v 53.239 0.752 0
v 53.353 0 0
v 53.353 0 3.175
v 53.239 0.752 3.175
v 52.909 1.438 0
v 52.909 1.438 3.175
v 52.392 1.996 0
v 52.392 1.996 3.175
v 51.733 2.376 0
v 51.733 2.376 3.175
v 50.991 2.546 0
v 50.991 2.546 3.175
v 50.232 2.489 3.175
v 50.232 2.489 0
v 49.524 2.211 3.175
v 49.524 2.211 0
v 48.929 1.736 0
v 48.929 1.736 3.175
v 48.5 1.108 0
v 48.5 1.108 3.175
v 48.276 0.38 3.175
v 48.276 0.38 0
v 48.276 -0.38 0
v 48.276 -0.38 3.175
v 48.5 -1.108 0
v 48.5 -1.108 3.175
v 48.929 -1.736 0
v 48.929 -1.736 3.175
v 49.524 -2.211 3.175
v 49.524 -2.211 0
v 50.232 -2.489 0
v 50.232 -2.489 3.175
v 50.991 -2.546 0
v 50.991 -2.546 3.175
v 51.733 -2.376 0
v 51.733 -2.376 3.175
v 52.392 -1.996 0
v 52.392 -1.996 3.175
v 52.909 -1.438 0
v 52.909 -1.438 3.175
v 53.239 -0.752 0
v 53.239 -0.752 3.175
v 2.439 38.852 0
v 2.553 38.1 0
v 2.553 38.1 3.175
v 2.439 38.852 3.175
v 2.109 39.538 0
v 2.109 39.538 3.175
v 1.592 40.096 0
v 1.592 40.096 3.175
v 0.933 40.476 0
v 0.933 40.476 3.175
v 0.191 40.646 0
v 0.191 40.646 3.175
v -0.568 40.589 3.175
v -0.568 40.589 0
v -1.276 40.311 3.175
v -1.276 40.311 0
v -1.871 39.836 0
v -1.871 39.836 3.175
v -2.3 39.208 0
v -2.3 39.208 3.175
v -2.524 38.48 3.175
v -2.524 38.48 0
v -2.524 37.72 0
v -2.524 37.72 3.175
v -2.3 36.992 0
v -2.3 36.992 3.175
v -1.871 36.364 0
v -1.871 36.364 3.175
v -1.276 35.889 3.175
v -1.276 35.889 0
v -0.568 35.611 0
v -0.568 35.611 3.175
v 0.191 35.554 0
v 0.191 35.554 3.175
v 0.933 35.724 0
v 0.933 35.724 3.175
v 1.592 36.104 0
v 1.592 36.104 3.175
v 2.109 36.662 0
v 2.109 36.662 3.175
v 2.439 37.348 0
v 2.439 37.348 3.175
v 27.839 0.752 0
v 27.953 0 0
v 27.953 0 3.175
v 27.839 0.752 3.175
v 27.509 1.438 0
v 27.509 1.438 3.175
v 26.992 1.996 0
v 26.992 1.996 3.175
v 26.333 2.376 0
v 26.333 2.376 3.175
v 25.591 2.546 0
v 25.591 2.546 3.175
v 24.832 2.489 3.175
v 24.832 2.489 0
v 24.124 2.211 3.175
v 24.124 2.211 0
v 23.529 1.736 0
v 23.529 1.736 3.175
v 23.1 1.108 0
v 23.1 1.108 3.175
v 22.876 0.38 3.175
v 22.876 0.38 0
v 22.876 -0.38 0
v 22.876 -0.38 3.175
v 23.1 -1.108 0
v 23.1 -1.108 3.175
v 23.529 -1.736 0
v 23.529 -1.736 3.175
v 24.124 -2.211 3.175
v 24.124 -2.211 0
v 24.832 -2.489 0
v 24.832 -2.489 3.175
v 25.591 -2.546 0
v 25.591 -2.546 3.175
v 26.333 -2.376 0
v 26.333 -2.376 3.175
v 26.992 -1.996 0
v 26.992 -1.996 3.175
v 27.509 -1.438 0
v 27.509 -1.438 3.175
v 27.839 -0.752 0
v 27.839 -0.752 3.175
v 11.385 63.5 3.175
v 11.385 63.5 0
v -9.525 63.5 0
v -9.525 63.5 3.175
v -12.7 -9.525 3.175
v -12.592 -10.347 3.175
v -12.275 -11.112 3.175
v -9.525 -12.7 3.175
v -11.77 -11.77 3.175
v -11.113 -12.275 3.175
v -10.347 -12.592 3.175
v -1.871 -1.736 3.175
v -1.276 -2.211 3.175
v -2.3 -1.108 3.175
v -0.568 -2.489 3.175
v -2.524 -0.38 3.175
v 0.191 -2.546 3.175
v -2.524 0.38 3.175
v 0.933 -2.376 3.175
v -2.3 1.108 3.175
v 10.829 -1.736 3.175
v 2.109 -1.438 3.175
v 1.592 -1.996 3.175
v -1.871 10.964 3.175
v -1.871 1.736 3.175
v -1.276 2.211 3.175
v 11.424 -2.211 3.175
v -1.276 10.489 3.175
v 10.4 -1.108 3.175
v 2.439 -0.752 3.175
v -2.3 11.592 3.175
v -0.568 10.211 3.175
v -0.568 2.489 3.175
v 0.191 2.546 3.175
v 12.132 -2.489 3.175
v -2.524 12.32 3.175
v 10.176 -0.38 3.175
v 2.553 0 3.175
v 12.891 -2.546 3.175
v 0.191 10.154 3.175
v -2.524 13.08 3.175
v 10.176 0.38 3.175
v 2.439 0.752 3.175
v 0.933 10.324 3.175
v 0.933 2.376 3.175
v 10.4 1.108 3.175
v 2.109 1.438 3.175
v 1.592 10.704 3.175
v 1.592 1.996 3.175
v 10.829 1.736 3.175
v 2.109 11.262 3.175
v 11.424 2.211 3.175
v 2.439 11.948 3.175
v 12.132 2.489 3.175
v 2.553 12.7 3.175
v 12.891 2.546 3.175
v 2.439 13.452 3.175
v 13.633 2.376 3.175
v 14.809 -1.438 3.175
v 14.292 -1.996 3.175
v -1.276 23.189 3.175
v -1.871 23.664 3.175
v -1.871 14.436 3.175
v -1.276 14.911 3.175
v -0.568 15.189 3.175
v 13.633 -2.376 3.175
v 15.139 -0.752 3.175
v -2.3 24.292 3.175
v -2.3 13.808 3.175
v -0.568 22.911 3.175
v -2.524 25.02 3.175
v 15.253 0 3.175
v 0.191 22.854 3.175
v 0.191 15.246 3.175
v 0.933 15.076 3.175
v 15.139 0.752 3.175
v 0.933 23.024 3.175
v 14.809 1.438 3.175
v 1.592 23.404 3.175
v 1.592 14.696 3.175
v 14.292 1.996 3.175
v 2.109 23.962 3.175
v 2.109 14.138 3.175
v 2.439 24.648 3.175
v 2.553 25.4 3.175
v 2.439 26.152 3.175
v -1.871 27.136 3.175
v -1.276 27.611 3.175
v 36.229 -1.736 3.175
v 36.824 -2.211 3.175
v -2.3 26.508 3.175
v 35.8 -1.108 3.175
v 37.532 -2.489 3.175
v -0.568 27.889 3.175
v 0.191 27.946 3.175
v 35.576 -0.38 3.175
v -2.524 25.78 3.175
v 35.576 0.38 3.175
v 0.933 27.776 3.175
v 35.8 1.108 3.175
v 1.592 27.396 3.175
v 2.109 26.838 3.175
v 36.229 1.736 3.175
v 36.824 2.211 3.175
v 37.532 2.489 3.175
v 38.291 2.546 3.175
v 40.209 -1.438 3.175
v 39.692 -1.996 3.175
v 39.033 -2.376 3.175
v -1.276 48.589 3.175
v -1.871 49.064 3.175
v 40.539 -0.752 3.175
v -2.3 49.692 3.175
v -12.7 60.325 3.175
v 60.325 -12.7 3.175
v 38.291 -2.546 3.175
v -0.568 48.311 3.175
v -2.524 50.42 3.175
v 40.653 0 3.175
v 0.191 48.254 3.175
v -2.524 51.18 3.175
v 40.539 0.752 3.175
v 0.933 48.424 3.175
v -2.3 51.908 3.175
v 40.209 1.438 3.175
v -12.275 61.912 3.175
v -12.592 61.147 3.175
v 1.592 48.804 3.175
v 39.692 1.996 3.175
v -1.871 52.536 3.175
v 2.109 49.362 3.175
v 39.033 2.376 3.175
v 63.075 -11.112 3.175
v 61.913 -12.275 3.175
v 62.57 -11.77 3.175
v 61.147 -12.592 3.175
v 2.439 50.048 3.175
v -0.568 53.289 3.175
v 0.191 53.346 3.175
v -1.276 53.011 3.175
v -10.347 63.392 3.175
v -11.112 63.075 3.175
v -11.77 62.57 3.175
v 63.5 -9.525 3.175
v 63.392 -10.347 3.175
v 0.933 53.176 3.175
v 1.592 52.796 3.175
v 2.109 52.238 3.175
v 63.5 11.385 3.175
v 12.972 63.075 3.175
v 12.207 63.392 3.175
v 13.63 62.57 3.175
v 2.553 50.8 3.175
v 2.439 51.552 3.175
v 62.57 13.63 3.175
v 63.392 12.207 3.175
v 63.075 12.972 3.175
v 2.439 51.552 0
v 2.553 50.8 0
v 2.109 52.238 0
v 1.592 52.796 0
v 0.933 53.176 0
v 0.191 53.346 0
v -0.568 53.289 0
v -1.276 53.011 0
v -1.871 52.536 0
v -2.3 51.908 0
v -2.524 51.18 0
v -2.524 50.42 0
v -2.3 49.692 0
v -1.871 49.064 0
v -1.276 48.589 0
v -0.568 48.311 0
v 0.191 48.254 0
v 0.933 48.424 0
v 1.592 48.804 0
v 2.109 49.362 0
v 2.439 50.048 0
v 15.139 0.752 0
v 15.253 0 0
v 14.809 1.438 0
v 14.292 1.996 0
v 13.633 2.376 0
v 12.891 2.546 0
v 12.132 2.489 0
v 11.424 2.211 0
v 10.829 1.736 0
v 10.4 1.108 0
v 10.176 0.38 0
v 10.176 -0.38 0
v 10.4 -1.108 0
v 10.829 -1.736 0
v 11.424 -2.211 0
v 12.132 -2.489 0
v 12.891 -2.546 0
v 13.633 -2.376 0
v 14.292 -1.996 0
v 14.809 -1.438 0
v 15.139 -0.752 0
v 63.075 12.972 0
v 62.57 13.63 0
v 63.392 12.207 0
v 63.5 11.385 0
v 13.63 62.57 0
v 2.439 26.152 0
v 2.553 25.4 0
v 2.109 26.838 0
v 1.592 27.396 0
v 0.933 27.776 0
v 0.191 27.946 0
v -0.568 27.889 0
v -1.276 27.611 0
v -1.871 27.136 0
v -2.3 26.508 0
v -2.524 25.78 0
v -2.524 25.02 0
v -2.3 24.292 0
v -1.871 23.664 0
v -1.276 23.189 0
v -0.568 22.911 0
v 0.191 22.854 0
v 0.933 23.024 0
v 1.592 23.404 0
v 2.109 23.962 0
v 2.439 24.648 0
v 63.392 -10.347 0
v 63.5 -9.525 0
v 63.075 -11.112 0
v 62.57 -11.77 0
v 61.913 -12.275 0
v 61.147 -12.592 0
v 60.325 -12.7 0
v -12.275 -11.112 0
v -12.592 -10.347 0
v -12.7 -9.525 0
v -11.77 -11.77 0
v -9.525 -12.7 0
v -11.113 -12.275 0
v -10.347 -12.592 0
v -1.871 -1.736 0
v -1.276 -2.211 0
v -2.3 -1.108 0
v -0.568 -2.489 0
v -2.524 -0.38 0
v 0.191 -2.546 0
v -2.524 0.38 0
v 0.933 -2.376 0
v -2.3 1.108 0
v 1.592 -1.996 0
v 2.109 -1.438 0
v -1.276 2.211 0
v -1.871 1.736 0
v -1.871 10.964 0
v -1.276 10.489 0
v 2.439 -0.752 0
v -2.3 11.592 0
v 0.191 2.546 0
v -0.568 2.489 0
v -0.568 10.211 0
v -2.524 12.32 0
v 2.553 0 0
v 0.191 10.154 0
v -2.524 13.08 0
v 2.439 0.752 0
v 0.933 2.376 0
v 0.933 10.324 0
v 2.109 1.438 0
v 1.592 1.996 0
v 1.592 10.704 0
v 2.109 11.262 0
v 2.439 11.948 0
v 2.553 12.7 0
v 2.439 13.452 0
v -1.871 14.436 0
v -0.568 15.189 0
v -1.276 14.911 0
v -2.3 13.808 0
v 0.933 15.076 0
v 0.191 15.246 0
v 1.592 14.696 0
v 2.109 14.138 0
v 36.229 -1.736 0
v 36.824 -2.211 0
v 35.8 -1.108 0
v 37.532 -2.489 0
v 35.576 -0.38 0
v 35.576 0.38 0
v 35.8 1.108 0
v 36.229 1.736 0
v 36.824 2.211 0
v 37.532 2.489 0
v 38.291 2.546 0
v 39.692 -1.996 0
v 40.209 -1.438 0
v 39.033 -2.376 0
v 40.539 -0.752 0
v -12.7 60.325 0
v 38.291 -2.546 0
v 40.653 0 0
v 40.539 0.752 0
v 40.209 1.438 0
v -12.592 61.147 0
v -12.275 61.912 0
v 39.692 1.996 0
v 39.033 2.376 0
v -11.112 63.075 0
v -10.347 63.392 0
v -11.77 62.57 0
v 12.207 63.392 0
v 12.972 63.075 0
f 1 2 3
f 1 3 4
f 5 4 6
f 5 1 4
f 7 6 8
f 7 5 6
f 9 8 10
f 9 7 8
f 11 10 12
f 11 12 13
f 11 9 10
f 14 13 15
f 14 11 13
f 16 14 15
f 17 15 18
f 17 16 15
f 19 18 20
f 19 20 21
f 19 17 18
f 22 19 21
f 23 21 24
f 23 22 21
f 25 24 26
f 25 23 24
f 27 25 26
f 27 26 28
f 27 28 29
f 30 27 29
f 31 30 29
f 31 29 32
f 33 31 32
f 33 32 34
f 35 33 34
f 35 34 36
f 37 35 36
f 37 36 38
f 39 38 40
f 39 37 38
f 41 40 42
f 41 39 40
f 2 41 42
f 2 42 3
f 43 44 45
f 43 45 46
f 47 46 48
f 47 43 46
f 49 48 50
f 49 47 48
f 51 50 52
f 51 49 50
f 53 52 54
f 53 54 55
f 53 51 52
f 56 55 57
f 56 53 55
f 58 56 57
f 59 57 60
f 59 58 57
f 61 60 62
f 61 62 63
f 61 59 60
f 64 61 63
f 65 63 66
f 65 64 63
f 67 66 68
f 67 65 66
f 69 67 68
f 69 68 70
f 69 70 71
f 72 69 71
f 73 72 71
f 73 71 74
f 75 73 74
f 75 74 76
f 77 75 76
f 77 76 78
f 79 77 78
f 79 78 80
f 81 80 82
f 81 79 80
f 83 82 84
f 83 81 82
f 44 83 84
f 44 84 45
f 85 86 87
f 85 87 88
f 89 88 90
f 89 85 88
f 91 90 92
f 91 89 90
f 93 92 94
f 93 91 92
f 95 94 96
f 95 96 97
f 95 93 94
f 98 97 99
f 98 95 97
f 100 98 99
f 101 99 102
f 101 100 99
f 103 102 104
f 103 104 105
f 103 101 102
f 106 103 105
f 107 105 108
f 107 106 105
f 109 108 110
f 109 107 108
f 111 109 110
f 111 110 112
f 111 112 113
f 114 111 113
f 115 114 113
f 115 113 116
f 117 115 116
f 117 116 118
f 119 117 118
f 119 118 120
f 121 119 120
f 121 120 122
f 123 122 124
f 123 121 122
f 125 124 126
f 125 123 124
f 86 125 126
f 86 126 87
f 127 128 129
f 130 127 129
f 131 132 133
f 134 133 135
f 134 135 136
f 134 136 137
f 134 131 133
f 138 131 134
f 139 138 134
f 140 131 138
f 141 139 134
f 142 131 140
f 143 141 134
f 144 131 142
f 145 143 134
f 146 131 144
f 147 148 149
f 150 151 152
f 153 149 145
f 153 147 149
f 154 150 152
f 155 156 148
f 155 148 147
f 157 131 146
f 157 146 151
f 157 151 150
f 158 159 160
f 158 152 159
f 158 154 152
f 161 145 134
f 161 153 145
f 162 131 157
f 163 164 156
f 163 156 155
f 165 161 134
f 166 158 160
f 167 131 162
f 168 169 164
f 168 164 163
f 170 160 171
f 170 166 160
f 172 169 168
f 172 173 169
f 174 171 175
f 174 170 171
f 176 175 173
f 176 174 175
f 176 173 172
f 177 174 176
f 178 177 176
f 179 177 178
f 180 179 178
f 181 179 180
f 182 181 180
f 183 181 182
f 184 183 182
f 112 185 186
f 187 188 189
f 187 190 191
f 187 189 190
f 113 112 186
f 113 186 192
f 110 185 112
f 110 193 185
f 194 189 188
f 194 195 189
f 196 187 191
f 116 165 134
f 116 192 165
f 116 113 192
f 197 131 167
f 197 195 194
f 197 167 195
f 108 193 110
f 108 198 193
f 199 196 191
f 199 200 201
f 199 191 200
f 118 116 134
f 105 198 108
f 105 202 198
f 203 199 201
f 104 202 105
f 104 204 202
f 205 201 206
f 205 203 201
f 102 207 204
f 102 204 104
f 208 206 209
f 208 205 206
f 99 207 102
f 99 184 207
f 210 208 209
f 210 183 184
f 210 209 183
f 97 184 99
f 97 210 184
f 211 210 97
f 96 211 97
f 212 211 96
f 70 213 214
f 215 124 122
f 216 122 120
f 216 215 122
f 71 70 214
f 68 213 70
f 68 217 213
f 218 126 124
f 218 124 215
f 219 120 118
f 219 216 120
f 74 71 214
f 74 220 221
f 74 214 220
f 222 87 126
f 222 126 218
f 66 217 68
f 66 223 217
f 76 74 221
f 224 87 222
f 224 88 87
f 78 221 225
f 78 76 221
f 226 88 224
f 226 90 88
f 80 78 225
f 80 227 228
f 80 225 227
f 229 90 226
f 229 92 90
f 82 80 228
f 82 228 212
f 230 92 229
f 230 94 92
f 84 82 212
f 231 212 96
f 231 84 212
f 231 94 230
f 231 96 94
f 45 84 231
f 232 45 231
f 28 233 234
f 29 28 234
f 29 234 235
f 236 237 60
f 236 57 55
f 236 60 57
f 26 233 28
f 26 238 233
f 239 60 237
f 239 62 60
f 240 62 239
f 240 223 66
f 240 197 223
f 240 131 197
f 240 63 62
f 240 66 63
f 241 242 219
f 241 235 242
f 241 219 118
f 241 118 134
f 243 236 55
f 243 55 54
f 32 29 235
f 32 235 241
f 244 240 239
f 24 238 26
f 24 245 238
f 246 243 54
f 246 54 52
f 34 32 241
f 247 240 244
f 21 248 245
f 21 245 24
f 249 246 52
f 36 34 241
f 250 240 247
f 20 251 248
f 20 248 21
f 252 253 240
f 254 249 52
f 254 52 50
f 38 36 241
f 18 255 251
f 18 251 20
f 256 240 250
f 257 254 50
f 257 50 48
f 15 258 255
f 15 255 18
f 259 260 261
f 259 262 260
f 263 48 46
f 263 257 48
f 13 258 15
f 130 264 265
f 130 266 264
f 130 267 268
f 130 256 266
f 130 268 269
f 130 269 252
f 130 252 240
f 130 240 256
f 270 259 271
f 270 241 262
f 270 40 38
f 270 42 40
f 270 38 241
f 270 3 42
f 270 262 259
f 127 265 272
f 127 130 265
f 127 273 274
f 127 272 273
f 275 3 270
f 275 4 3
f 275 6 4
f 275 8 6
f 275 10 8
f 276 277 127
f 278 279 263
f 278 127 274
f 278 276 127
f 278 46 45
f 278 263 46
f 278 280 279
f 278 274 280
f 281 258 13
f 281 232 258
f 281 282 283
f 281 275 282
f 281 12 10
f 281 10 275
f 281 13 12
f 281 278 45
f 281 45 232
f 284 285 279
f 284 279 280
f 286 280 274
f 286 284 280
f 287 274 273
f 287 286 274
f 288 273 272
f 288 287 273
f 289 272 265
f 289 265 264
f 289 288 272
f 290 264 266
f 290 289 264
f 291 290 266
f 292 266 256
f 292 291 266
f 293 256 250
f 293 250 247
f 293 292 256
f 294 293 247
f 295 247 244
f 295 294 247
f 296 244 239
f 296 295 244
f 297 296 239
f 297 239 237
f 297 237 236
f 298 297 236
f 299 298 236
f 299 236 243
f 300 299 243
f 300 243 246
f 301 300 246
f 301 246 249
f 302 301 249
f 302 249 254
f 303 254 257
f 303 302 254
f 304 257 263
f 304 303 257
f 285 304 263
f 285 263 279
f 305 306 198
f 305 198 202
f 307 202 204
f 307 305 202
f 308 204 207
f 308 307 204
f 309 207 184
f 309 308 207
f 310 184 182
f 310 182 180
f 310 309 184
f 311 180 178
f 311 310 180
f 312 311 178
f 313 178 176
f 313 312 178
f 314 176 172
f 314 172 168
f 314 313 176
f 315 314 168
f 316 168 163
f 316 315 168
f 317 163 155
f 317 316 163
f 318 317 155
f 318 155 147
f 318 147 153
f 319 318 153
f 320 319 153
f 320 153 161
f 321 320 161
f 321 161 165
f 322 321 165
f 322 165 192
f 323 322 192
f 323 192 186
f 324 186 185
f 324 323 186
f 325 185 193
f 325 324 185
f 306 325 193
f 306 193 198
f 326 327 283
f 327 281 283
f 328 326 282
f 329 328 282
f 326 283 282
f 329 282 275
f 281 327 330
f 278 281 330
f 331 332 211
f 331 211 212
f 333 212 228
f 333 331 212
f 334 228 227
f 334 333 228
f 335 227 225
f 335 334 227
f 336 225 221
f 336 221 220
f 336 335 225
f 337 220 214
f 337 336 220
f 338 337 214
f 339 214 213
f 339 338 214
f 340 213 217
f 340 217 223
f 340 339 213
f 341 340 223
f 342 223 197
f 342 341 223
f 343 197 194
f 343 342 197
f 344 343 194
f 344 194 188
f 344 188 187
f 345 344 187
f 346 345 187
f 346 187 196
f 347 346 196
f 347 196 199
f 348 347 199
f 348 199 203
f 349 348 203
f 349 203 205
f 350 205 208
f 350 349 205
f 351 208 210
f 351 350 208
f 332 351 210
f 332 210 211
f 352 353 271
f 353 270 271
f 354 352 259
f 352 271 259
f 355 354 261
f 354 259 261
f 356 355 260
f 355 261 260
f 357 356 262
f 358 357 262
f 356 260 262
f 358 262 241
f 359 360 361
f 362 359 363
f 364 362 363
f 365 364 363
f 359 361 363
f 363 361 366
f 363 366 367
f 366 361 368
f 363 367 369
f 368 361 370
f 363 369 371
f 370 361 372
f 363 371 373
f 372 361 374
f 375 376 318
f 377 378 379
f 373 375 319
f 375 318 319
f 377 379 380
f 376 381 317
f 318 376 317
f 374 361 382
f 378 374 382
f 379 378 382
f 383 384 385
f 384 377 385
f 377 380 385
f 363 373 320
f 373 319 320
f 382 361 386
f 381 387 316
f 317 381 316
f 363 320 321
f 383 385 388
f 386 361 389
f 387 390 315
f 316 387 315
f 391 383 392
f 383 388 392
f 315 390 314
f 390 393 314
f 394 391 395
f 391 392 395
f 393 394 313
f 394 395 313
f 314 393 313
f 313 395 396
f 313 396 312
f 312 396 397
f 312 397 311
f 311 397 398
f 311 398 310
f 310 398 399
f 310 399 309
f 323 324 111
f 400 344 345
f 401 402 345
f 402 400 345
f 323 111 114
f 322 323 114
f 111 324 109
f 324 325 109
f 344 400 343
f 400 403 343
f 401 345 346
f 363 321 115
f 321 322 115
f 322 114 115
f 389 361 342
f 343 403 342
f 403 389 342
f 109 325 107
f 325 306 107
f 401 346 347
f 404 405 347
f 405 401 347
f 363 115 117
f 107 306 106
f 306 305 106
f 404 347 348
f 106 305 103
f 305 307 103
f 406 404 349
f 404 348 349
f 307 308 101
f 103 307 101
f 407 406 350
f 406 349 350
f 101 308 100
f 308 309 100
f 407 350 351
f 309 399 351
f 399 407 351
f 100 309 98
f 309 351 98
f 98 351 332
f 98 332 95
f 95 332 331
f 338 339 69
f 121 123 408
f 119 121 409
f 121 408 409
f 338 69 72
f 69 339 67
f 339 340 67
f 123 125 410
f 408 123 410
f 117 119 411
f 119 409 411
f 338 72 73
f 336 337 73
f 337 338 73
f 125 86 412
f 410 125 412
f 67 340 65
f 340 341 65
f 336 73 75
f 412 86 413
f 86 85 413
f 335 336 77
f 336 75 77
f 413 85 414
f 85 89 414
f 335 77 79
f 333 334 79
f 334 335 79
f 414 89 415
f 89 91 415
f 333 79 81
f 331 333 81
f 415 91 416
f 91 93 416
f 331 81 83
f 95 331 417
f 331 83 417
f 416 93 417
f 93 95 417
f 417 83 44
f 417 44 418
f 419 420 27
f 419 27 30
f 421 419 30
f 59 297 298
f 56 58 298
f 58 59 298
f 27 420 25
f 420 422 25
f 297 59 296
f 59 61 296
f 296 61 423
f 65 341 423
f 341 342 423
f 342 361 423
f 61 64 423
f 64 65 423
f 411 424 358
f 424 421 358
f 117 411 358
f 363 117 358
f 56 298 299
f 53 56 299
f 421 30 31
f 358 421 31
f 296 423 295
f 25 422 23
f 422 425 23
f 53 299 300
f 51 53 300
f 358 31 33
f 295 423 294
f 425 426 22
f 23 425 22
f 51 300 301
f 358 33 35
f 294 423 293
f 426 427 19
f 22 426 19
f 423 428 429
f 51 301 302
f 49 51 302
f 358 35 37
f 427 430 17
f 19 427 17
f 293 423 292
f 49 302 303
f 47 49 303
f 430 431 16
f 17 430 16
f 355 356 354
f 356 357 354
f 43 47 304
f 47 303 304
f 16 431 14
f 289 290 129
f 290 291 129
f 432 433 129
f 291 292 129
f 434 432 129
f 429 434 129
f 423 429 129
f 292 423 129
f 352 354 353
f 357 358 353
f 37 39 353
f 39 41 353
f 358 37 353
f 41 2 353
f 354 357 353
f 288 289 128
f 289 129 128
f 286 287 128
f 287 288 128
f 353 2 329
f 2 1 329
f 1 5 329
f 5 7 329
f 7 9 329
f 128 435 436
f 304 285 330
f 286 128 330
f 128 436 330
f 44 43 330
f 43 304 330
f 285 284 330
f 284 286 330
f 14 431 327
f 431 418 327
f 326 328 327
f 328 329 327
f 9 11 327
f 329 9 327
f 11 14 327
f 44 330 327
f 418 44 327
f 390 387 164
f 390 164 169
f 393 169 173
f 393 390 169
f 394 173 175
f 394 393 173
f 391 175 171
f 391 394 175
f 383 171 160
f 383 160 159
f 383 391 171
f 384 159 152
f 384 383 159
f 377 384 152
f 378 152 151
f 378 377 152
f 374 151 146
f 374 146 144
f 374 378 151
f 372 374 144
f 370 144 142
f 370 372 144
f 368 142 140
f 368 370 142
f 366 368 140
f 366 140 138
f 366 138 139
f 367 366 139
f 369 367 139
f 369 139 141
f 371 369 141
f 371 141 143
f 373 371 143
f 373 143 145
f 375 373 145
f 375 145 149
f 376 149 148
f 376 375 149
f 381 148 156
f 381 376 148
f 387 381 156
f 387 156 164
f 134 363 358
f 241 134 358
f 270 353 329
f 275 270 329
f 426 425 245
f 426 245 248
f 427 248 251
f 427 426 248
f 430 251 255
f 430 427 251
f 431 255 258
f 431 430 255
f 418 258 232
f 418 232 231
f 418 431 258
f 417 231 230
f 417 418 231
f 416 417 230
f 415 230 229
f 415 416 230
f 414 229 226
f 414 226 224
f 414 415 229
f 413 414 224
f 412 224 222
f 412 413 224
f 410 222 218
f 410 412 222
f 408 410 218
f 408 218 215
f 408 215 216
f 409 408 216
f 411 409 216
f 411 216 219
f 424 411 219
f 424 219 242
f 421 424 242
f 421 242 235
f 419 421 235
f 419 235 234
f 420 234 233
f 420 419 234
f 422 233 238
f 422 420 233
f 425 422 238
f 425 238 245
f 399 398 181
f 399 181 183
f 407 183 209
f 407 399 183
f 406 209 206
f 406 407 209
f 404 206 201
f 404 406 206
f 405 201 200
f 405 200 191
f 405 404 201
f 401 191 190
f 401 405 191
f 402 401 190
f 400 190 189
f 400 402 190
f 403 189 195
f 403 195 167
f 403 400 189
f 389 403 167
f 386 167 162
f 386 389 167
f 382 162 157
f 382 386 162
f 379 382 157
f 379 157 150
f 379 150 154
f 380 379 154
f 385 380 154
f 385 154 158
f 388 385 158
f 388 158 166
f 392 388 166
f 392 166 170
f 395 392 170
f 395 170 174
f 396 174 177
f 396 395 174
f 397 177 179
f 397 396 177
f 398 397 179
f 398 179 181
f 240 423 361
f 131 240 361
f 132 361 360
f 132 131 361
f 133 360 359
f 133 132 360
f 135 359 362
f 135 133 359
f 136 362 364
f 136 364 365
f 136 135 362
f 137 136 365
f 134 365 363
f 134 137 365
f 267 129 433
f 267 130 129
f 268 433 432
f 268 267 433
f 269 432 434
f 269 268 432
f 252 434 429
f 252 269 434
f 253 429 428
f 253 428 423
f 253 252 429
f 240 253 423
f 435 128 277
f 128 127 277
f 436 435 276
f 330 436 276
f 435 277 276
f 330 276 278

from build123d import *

# Parameters (mm, degrees)
F0_R     = 2.5527
F1_DEPTH = 3.175
F2_R     = 3.175


with BuildPart() as f1:
    # F0 (on Top) → F1 (new body)
    with BuildSketch(Plane.XY):
        Polygon((12.7, 63.5), (-12.7, 63.5), (-12.7, -12.7), (63.5, -12.7), (63.5, 12.7), align=None)
        Circle(F0_R, mode=Mode.SUBTRACT)
        with Locations((12.7, 0)):
            Circle(F0_R, mode=Mode.SUBTRACT)
        with Locations((25.4, 0)):
            Circle(F0_R, mode=Mode.SUBTRACT)
        with Locations((0, 12.7)):
            Circle(F0_R, mode=Mode.SUBTRACT)
        with Locations((0, 25.4)):
            Circle(F0_R, mode=Mode.SUBTRACT)
        with Locations((38.1, 0)):
            Circle(F0_R, mode=Mode.SUBTRACT)
        with Locations((50.8, 0)):
            Circle(F0_R, mode=Mode.SUBTRACT)
        with Locations((0, 38.1)):
            Circle(F0_R, mode=Mode.SUBTRACT)
        with Locations((0, 50.8)):
            Circle(F0_R, mode=Mode.SUBTRACT)
    extrude(amount=F1_DEPTH)

    # F2
    f2_edges = [f1.edges().sort_by_distance(p)[0] for p in [
        (-12.7, 63.5, 1.5875),
        (12.7, 63.5, 1.5875),
        (-12.7, -12.7, 1.5875),
        (63.5, -12.7, 1.5875),
        (63.5, 12.7, 1.5875),
    ]]
    fillet(f2_edges, radius=F2_R)


solid = f1.part
